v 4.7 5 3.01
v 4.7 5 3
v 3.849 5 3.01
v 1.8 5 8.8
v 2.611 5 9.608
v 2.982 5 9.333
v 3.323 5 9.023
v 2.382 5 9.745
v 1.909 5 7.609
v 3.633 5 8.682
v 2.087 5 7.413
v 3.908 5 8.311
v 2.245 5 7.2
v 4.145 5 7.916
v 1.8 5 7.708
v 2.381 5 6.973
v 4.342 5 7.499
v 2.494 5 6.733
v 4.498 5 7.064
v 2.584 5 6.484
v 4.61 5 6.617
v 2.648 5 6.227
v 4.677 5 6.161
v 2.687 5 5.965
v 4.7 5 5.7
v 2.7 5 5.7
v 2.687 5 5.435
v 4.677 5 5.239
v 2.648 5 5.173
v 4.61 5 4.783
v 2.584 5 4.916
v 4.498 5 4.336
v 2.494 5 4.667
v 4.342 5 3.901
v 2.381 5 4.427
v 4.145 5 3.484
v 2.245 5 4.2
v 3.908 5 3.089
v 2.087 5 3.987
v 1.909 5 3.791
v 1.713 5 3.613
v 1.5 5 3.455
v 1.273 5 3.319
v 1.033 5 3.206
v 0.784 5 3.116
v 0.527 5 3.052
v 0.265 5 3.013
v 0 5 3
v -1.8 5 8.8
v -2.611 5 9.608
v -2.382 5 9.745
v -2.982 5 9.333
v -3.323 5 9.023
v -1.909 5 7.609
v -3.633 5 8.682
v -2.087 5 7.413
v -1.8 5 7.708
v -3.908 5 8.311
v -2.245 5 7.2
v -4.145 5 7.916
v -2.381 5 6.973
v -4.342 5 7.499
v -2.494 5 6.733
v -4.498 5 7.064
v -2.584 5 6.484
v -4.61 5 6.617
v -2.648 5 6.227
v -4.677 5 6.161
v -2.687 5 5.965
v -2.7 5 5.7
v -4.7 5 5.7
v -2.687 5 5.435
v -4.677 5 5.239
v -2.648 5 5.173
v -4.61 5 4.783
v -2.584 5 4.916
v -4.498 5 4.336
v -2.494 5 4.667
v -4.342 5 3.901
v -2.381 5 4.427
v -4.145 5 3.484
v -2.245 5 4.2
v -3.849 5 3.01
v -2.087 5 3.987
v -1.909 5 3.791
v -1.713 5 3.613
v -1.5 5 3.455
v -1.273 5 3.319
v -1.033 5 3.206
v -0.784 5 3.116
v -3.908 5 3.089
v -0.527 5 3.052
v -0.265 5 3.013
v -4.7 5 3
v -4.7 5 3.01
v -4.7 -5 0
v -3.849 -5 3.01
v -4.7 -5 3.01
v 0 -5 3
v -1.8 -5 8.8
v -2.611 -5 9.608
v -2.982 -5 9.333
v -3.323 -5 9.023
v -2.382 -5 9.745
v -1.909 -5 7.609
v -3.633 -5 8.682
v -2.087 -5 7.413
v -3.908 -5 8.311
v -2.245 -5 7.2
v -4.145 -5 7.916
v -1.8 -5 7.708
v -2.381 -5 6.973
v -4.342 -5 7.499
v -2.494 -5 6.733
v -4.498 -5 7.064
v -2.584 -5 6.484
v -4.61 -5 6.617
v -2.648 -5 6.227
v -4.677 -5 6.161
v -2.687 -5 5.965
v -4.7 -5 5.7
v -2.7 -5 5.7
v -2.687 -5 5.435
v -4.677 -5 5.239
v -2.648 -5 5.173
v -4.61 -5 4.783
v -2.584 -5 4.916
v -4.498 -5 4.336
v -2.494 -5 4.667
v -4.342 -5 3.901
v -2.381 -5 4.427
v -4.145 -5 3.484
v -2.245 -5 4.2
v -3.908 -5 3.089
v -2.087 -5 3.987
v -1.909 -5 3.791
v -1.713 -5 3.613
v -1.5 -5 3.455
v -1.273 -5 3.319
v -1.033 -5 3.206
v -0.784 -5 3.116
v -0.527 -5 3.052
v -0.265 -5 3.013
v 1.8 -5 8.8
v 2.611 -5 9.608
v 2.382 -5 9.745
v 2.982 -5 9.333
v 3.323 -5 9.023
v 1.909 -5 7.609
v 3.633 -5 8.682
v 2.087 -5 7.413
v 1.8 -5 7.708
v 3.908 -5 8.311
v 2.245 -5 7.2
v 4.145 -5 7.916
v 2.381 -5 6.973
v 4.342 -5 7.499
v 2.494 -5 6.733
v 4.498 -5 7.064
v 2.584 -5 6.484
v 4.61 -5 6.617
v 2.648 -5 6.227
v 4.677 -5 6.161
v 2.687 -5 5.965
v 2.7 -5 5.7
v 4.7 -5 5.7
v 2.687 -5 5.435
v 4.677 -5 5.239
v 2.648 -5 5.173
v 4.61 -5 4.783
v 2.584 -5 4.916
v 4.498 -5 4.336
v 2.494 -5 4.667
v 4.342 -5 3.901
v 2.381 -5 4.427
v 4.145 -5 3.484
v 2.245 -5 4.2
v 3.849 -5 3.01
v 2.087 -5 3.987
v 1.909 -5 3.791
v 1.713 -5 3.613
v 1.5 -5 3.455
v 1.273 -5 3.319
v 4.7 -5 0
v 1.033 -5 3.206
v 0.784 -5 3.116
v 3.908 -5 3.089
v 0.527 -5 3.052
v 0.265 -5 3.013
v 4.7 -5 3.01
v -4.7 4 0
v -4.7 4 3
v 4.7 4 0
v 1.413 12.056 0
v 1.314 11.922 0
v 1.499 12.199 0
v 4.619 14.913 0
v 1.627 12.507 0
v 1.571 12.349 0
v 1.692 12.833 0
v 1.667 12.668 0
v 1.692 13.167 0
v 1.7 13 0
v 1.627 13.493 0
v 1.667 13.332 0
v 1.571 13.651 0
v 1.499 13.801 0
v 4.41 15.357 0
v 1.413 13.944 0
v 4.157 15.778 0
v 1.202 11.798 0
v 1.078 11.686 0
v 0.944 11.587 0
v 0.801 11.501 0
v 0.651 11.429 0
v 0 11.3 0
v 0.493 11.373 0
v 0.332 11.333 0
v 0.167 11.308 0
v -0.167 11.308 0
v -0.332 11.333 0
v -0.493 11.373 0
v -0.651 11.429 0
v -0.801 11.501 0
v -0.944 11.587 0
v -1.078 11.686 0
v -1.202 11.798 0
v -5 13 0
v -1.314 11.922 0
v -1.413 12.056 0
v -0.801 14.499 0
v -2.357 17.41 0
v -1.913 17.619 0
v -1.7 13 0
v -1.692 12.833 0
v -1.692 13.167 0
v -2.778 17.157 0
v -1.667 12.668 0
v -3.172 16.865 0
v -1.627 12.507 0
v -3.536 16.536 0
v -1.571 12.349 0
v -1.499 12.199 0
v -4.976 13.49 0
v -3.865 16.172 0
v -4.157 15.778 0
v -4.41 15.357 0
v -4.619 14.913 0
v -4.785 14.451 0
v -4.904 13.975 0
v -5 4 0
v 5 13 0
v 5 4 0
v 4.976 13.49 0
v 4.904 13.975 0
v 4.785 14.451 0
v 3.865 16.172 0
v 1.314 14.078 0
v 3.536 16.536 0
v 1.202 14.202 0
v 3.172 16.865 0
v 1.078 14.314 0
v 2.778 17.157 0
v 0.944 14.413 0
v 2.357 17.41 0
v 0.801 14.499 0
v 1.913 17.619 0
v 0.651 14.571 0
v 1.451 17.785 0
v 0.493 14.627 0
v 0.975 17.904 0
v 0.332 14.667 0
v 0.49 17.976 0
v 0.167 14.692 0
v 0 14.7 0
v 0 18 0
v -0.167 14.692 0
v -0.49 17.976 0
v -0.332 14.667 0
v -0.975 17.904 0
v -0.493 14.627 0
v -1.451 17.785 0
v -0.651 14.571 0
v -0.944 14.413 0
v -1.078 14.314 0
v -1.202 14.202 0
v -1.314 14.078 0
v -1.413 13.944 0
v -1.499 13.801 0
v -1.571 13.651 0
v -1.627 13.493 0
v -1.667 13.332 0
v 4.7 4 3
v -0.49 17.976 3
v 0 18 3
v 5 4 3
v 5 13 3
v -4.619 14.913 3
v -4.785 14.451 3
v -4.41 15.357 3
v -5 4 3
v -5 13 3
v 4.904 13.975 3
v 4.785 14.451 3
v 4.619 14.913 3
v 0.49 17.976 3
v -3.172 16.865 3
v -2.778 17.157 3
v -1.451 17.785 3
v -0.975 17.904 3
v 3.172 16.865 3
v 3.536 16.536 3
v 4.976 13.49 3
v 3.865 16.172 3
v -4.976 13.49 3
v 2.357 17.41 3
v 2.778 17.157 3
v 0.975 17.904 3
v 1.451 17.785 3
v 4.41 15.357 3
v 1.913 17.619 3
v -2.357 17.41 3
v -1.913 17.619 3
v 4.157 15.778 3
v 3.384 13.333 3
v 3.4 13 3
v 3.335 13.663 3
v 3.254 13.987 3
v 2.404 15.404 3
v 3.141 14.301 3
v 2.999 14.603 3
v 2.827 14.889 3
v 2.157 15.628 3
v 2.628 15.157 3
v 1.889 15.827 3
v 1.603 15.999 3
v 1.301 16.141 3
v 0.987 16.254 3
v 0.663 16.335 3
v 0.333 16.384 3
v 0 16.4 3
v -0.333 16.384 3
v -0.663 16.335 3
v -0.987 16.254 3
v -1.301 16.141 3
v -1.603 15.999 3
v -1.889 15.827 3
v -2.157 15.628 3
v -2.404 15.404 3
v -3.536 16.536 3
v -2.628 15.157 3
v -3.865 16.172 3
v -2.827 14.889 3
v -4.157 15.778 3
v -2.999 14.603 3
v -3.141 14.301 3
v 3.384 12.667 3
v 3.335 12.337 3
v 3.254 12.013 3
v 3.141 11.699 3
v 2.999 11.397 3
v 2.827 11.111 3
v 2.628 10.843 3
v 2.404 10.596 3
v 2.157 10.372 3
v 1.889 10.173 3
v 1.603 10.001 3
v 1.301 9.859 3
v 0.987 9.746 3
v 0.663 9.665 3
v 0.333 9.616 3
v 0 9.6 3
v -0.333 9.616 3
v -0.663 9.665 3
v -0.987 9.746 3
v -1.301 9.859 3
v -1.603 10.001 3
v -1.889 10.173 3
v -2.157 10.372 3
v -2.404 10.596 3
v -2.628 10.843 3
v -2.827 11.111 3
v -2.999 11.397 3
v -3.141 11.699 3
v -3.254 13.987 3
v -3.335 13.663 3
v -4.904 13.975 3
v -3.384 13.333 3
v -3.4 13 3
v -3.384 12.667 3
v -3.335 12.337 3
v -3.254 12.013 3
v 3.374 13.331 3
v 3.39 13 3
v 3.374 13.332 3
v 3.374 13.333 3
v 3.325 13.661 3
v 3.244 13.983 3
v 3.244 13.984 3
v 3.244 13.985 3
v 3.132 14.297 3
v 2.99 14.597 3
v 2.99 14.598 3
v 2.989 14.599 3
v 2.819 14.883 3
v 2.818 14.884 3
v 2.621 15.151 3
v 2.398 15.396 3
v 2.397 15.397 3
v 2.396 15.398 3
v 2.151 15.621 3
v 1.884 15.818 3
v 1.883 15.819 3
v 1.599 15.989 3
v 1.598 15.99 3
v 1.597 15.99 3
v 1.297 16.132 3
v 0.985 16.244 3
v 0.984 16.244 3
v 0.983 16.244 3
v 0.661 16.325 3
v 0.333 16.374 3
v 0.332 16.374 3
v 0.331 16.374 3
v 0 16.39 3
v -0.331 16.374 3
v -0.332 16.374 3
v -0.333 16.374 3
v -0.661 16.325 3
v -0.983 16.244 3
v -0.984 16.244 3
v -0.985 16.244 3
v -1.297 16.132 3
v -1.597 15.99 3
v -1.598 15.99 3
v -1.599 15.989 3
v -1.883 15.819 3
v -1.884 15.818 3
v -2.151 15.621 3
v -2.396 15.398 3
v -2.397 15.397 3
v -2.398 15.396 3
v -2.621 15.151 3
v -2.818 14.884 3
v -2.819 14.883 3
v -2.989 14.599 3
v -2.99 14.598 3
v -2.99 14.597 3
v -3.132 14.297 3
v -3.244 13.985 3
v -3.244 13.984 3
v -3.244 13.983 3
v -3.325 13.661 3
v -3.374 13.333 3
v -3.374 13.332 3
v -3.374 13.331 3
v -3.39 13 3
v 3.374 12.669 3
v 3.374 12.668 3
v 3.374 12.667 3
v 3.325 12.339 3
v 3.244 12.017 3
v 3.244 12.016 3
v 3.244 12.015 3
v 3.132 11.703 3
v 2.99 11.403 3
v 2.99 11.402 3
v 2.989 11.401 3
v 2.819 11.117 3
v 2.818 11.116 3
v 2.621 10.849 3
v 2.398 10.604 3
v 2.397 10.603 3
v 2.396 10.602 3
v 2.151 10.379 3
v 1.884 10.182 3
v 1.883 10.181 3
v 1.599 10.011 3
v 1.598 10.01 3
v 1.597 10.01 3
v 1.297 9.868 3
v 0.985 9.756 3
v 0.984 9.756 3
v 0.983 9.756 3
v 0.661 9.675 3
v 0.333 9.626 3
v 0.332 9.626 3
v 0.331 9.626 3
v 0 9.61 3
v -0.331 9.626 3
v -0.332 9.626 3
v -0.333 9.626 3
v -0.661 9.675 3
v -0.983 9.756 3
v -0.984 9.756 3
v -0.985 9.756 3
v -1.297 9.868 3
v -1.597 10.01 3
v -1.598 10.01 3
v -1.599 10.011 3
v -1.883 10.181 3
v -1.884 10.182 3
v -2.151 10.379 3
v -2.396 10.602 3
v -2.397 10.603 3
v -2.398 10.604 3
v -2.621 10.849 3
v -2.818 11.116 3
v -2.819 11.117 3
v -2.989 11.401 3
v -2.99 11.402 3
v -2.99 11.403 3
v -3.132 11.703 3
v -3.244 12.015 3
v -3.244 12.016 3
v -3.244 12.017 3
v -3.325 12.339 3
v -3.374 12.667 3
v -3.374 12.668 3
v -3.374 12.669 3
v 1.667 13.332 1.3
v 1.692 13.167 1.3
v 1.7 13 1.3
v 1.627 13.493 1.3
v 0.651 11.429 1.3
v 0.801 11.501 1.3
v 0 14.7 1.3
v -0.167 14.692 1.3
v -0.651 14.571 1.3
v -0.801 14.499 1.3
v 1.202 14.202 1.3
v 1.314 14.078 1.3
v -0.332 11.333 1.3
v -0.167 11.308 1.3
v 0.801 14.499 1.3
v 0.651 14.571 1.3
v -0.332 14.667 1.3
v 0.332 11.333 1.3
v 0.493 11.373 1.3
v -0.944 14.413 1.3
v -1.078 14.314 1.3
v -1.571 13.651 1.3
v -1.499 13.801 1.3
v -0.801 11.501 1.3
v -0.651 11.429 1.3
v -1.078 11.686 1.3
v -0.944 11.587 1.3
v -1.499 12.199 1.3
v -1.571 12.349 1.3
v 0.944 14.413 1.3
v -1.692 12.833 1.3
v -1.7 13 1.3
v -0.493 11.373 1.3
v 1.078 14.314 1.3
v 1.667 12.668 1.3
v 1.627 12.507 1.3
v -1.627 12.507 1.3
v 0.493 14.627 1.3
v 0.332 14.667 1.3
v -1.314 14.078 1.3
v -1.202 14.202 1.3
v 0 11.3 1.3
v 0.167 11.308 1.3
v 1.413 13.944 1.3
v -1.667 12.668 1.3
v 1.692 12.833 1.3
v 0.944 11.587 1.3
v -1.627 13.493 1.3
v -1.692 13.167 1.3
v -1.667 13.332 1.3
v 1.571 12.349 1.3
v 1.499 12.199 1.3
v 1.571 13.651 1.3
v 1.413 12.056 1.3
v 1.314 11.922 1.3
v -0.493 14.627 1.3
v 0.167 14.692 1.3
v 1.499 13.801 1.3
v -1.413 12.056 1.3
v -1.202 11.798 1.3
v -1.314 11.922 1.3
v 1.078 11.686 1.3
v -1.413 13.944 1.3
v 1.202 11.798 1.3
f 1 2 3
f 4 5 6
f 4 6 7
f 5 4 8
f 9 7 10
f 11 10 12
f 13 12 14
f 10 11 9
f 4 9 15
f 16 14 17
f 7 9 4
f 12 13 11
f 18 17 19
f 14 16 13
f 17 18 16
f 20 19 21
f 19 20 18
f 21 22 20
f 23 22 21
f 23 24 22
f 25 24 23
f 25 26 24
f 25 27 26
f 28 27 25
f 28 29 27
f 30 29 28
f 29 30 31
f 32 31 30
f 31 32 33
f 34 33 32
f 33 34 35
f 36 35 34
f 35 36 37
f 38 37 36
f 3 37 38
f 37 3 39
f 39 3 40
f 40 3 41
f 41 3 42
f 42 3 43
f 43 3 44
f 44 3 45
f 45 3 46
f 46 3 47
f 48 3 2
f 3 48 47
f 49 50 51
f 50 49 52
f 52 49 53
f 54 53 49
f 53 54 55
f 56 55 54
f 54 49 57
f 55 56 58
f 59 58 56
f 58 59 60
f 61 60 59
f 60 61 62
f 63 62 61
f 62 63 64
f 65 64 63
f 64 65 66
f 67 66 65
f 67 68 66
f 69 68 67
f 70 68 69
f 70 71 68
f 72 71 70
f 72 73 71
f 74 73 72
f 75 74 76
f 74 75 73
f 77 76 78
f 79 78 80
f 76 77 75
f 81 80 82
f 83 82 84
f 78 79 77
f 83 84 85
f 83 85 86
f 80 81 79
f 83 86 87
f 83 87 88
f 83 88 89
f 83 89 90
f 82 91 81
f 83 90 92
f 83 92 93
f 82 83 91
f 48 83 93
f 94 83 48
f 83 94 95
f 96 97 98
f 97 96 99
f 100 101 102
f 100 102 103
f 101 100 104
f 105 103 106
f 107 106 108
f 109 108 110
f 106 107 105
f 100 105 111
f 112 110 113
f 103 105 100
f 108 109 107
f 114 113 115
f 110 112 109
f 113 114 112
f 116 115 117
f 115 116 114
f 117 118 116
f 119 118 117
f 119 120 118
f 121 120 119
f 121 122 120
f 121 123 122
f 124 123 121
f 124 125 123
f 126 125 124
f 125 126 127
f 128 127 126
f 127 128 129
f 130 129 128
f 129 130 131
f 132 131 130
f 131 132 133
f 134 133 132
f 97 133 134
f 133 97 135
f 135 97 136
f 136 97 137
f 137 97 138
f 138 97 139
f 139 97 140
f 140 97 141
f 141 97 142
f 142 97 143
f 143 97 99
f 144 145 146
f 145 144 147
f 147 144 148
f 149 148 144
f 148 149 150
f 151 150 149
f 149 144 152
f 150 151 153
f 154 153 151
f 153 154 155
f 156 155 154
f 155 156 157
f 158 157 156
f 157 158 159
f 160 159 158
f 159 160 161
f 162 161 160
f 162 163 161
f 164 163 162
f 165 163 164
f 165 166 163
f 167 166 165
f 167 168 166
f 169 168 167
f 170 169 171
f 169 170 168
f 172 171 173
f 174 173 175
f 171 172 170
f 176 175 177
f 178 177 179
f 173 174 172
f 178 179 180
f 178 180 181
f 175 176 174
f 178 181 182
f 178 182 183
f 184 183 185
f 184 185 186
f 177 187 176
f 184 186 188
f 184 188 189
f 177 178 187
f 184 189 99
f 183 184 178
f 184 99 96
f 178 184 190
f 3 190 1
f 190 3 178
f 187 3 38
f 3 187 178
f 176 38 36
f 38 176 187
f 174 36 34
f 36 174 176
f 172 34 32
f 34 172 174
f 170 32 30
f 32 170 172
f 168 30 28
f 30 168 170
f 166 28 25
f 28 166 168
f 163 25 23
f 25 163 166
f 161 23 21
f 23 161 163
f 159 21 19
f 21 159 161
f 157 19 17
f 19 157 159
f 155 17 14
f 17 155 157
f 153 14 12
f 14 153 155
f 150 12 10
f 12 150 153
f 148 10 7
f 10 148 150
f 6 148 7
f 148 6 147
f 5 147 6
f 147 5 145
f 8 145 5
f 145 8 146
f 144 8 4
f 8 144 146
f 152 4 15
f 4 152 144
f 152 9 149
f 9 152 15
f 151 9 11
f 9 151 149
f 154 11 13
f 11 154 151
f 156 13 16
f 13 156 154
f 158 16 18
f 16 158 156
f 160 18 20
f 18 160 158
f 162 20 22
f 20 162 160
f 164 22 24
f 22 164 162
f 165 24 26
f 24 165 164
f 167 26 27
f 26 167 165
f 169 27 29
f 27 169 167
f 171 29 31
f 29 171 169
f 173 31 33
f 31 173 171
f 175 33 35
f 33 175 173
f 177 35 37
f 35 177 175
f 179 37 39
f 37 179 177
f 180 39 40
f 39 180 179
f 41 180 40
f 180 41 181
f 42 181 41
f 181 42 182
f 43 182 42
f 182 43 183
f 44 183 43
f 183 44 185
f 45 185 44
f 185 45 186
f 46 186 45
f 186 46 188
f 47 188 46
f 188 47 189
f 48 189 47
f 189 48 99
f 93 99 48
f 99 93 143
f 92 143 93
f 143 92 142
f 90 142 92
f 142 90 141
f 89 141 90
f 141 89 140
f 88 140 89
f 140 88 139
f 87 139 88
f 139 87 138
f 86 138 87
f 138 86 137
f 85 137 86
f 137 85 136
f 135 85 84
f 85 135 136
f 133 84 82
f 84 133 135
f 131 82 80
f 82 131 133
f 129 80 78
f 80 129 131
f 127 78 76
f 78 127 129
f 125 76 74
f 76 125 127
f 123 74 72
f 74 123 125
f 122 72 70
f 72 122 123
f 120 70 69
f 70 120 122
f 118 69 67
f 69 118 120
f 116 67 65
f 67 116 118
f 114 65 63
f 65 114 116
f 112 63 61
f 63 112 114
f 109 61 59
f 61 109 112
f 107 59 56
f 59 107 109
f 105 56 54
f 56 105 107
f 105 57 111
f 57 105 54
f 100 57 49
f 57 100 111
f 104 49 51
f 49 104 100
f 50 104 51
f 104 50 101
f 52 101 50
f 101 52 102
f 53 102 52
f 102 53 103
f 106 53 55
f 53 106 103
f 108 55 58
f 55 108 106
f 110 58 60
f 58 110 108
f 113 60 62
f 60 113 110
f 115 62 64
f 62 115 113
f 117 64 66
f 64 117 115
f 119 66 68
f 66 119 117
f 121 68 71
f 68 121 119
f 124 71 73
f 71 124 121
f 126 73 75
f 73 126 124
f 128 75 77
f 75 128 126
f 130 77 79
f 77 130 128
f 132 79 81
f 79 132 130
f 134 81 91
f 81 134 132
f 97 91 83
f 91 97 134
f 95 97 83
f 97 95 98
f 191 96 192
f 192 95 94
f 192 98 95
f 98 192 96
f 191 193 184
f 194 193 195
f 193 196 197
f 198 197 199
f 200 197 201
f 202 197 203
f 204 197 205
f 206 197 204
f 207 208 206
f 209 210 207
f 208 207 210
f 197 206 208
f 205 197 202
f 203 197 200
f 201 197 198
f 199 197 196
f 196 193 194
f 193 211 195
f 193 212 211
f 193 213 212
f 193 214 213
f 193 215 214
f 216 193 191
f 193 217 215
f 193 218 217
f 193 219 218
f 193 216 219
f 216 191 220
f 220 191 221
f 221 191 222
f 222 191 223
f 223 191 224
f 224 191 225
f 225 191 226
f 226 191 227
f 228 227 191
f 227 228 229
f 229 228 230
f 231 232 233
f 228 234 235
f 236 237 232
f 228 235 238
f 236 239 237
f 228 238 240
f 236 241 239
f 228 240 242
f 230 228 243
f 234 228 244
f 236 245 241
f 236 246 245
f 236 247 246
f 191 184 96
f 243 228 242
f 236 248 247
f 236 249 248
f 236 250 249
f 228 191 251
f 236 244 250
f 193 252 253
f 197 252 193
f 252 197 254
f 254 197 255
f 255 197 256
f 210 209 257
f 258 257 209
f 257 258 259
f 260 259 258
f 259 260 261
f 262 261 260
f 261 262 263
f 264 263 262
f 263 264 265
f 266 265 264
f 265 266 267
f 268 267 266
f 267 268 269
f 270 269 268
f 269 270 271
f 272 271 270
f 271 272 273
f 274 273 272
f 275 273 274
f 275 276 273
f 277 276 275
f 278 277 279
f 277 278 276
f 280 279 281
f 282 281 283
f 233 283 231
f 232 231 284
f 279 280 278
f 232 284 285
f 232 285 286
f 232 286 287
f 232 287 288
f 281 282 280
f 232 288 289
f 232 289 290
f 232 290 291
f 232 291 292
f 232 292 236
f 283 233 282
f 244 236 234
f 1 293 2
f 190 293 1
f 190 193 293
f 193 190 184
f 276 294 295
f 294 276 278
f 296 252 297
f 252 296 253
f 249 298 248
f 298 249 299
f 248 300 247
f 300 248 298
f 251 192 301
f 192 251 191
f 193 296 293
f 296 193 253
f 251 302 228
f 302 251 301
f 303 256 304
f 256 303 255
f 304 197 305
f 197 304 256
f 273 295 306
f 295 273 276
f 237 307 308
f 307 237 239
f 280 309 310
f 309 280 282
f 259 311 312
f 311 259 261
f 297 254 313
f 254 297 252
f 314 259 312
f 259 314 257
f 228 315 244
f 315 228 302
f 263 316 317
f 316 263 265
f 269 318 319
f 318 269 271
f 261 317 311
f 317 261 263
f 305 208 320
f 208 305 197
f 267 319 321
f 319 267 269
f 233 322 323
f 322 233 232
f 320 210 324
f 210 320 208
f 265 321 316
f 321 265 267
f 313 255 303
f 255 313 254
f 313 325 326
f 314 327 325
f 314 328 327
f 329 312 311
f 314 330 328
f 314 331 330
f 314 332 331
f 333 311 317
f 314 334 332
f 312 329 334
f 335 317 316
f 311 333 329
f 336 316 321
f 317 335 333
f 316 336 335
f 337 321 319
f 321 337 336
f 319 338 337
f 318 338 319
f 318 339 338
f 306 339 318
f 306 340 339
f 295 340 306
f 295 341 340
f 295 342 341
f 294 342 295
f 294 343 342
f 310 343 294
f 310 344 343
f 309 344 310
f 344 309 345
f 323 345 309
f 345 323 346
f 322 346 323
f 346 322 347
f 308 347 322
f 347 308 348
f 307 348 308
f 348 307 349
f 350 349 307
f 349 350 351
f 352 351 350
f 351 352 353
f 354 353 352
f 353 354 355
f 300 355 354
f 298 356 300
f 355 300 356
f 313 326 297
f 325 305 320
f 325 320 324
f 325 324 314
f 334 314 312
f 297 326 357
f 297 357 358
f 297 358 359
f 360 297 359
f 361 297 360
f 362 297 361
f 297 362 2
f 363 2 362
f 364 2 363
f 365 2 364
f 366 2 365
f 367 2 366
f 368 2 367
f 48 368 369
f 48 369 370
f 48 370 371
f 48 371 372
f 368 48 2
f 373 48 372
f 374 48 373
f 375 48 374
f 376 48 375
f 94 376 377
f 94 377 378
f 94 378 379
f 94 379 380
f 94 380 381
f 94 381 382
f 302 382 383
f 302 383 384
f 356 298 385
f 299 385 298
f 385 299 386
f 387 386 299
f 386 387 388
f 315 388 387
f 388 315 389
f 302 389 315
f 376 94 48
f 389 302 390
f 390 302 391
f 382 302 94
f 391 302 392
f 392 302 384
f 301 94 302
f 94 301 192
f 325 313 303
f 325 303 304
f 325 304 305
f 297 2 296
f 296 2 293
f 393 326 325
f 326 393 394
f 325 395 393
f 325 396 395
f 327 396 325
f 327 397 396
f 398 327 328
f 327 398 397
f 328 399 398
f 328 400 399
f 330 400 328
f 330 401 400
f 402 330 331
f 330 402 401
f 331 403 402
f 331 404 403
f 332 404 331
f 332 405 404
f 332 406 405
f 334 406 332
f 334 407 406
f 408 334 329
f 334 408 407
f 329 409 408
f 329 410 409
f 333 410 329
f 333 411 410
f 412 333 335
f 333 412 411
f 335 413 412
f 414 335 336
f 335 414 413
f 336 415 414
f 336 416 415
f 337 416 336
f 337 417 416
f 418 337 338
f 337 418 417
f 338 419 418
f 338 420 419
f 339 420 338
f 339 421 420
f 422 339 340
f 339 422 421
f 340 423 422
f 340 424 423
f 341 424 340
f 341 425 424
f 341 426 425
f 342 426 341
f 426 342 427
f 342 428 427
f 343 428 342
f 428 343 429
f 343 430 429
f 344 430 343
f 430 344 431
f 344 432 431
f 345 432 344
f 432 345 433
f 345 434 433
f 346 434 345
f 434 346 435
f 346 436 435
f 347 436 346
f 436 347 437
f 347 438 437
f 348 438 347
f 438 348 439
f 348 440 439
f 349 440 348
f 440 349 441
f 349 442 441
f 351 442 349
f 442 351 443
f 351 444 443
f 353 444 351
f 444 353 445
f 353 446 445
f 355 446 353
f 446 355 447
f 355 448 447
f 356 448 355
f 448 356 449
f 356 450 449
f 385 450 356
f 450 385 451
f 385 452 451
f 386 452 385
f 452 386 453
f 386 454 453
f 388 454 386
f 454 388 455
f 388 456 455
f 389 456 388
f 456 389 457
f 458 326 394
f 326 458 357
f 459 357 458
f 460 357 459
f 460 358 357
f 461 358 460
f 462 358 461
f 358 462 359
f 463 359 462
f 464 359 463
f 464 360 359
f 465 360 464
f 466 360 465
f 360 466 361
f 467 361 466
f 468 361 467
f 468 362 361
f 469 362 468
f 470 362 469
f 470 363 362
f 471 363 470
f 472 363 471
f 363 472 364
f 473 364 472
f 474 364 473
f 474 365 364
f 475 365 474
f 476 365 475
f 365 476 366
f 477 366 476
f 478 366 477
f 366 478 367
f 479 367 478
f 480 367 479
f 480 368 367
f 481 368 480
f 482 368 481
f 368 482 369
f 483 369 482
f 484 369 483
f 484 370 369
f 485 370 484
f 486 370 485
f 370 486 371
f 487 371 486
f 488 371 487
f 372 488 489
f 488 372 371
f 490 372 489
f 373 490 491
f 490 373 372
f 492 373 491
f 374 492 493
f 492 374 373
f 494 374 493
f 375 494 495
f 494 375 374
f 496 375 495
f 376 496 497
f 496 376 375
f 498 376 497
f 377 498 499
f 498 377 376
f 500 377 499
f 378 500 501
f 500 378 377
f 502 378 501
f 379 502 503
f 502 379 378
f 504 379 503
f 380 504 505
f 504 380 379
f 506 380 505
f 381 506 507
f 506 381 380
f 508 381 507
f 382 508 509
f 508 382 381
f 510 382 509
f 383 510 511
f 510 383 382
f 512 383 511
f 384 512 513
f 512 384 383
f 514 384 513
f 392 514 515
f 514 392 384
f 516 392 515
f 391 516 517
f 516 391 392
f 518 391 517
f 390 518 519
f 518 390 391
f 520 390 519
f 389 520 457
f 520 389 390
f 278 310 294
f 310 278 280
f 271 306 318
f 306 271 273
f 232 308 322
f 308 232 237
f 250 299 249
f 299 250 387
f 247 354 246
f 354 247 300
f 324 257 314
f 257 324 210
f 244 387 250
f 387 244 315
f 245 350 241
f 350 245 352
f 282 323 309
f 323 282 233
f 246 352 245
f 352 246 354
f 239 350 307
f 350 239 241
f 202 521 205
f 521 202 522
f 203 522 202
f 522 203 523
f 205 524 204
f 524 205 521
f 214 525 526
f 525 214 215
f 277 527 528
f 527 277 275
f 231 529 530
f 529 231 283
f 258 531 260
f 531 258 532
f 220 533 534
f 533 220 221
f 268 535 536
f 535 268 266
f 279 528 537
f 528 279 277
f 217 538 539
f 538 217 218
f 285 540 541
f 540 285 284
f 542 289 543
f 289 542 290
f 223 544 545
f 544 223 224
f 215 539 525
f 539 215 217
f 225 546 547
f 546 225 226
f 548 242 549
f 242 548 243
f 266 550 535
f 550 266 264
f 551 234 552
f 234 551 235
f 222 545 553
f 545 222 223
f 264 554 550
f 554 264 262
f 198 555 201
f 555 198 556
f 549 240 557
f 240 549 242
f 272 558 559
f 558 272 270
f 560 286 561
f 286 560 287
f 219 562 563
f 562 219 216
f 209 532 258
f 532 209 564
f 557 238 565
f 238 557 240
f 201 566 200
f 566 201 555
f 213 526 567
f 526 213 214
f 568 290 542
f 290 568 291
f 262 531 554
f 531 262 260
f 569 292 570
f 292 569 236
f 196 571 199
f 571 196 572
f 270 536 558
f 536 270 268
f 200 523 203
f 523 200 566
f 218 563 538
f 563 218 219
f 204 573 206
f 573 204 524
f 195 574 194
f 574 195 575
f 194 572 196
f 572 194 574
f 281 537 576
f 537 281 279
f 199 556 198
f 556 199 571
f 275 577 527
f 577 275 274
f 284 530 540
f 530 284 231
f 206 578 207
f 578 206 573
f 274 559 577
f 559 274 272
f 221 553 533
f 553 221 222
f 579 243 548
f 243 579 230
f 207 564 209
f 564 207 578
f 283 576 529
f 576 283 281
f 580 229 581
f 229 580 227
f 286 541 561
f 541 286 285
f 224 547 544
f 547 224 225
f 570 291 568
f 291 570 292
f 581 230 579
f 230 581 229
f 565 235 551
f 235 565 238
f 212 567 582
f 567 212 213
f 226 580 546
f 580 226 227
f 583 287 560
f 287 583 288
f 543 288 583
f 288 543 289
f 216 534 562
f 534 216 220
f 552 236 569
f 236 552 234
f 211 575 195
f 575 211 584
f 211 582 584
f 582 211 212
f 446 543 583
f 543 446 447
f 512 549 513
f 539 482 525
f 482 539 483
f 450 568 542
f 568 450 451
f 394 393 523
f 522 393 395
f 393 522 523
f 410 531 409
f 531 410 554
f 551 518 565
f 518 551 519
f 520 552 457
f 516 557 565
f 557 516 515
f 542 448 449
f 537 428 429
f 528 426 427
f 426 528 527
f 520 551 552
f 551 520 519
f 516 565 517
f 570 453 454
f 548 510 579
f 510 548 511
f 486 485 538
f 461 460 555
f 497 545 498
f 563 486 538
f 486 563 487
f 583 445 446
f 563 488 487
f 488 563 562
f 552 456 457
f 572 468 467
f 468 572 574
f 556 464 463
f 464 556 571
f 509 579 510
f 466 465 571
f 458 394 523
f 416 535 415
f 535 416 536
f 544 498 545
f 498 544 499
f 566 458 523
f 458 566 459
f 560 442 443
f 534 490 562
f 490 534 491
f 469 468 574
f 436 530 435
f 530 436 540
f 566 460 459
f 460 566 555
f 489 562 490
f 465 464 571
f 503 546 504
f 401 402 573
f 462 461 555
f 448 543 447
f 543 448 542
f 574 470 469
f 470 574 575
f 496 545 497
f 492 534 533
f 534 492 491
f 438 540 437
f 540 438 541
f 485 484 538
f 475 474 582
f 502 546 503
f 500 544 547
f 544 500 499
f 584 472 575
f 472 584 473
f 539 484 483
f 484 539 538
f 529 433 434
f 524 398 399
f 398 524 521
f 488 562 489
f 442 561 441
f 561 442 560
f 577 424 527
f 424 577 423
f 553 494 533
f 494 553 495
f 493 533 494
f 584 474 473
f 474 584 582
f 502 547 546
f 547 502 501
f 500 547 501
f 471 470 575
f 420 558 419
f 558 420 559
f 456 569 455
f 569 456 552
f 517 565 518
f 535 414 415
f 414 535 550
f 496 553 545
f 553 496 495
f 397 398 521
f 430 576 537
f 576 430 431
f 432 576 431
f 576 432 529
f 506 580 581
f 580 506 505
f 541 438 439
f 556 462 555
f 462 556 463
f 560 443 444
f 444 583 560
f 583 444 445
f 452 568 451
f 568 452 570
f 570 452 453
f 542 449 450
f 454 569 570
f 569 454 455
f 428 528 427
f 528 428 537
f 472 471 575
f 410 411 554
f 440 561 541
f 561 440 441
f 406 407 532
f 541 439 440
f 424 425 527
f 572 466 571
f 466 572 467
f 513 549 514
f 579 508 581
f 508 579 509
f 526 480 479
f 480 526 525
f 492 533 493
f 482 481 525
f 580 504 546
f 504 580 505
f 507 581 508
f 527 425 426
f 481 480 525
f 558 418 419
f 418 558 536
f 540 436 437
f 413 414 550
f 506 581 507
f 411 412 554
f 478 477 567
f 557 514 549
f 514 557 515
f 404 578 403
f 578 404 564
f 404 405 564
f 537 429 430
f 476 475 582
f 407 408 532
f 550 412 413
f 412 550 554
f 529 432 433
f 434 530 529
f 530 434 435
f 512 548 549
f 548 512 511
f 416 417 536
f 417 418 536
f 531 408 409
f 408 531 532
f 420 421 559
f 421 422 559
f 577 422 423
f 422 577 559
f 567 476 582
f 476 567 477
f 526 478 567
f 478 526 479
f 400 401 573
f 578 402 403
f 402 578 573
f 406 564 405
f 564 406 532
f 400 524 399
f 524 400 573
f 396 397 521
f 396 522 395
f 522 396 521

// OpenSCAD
/* [Cable] */
// Cable diameter
cable_d = 5; // [2:0.5:12]
// Radial clearance around cable
cable_clearance = 0.2; // [0:0.05:0.6]
// Snap opening as fraction of cable diameter (smaller = tighter grip)
opening_ratio = 0.72; // [0.5:0.02:0.9]

/* [Clip Body] */
// Clip length along the cable
clip_len = 10; // [6:1:30]
// Wall thickness of the snap arms
wall = 2; // [1.2:0.2:3.5]
// Base plate thickness (against the wall)
base_t = 3; // [2:0.5:5]

/* [Mounting] */
// Distance from clip end to screw center
tab_len = 8; // [5:1:20]
// Width of the screw tab
tab_w = 10; // [8:1:16]
// Screw hole diameter (M3 clearance)
screw_d = 3.4; // [2.5:0.1:5.5]
// Countersink head diameter (M3 head + clearance)
cs_d = 6.8; // [4:0.1:10]

$fn = 64;

// ---- Derived values ----
cable_r   = cable_d / 2 + cable_clearance;
outer_r   = cable_r + wall;
center_h  = base_t + cable_r;          // cable axis height above wall
opening_w = cable_d * opening_ratio;   // snap gap width
base_w    = 2 * outer_r;               // body width
hole_y    = clip_len / 2 + tab_len;    // screw center position
cs_depth  = (cs_d - screw_d) / 2;      // 90-degree countersink depth
flare     = wall * 0.8;                // lead-in chamfer size

// 2D cross-section perpendicular to the cable
module clip_profile() {
    difference() {
        union() {
            translate([0, center_h]) circle(r = outer_r);
            translate([-base_w/2, 0]) square([base_w, base_t + 0.01]);
        }
        // cable bore
        translate([0, center_h]) circle(r = cable_r);
        // snap opening
        translate([-opening_w/2, center_h]) square([opening_w, outer_r + 1]);
        // lead-in flare at the tips
        translate([0, center_h]) polygon([
            [-opening_w/2, outer_r - flare],
            [ opening_w/2, outer_r - flare],
            [ opening_w/2 + flare, outer_r + 1],
            [-opening_w/2 - flare, outer_r + 1]
        ]);
    }
}

// extruded clip, cable axis along Y, base on z=0
module clip_body() {
    rotate([90, 0, 0])
        translate([0, 0, -clip_len/2])
            linear_extrude(clip_len)
                clip_profile();
}

// screw tab with rounded end
module tab() {
    hull() {
        translate([-tab_w/2, clip_len/2 - 1, 0]) cube([tab_w, 1, base_t]);
        translate([0, hole_y, 0]) cylinder(d = tab_w, h = base_t);
    }
}

// countersunk M3 cutter
module screw_cutter() {
    translate([0, hole_y, 0]) {
        translate([0, 0, -0.5]) cylinder(d = screw_d, h = base_t + 1);
        translate([0, 0, base_t - cs_depth]) cylinder(d1 = screw_d, d2 = cs_d, h = cs_depth + 0.01);
        translate([0, 0, base_t]) cylinder(d = cs_d, h = 1);
    }
}

difference() {
    union() {
        clip_body();
        tab();
    }
    screw_cutter();
}
